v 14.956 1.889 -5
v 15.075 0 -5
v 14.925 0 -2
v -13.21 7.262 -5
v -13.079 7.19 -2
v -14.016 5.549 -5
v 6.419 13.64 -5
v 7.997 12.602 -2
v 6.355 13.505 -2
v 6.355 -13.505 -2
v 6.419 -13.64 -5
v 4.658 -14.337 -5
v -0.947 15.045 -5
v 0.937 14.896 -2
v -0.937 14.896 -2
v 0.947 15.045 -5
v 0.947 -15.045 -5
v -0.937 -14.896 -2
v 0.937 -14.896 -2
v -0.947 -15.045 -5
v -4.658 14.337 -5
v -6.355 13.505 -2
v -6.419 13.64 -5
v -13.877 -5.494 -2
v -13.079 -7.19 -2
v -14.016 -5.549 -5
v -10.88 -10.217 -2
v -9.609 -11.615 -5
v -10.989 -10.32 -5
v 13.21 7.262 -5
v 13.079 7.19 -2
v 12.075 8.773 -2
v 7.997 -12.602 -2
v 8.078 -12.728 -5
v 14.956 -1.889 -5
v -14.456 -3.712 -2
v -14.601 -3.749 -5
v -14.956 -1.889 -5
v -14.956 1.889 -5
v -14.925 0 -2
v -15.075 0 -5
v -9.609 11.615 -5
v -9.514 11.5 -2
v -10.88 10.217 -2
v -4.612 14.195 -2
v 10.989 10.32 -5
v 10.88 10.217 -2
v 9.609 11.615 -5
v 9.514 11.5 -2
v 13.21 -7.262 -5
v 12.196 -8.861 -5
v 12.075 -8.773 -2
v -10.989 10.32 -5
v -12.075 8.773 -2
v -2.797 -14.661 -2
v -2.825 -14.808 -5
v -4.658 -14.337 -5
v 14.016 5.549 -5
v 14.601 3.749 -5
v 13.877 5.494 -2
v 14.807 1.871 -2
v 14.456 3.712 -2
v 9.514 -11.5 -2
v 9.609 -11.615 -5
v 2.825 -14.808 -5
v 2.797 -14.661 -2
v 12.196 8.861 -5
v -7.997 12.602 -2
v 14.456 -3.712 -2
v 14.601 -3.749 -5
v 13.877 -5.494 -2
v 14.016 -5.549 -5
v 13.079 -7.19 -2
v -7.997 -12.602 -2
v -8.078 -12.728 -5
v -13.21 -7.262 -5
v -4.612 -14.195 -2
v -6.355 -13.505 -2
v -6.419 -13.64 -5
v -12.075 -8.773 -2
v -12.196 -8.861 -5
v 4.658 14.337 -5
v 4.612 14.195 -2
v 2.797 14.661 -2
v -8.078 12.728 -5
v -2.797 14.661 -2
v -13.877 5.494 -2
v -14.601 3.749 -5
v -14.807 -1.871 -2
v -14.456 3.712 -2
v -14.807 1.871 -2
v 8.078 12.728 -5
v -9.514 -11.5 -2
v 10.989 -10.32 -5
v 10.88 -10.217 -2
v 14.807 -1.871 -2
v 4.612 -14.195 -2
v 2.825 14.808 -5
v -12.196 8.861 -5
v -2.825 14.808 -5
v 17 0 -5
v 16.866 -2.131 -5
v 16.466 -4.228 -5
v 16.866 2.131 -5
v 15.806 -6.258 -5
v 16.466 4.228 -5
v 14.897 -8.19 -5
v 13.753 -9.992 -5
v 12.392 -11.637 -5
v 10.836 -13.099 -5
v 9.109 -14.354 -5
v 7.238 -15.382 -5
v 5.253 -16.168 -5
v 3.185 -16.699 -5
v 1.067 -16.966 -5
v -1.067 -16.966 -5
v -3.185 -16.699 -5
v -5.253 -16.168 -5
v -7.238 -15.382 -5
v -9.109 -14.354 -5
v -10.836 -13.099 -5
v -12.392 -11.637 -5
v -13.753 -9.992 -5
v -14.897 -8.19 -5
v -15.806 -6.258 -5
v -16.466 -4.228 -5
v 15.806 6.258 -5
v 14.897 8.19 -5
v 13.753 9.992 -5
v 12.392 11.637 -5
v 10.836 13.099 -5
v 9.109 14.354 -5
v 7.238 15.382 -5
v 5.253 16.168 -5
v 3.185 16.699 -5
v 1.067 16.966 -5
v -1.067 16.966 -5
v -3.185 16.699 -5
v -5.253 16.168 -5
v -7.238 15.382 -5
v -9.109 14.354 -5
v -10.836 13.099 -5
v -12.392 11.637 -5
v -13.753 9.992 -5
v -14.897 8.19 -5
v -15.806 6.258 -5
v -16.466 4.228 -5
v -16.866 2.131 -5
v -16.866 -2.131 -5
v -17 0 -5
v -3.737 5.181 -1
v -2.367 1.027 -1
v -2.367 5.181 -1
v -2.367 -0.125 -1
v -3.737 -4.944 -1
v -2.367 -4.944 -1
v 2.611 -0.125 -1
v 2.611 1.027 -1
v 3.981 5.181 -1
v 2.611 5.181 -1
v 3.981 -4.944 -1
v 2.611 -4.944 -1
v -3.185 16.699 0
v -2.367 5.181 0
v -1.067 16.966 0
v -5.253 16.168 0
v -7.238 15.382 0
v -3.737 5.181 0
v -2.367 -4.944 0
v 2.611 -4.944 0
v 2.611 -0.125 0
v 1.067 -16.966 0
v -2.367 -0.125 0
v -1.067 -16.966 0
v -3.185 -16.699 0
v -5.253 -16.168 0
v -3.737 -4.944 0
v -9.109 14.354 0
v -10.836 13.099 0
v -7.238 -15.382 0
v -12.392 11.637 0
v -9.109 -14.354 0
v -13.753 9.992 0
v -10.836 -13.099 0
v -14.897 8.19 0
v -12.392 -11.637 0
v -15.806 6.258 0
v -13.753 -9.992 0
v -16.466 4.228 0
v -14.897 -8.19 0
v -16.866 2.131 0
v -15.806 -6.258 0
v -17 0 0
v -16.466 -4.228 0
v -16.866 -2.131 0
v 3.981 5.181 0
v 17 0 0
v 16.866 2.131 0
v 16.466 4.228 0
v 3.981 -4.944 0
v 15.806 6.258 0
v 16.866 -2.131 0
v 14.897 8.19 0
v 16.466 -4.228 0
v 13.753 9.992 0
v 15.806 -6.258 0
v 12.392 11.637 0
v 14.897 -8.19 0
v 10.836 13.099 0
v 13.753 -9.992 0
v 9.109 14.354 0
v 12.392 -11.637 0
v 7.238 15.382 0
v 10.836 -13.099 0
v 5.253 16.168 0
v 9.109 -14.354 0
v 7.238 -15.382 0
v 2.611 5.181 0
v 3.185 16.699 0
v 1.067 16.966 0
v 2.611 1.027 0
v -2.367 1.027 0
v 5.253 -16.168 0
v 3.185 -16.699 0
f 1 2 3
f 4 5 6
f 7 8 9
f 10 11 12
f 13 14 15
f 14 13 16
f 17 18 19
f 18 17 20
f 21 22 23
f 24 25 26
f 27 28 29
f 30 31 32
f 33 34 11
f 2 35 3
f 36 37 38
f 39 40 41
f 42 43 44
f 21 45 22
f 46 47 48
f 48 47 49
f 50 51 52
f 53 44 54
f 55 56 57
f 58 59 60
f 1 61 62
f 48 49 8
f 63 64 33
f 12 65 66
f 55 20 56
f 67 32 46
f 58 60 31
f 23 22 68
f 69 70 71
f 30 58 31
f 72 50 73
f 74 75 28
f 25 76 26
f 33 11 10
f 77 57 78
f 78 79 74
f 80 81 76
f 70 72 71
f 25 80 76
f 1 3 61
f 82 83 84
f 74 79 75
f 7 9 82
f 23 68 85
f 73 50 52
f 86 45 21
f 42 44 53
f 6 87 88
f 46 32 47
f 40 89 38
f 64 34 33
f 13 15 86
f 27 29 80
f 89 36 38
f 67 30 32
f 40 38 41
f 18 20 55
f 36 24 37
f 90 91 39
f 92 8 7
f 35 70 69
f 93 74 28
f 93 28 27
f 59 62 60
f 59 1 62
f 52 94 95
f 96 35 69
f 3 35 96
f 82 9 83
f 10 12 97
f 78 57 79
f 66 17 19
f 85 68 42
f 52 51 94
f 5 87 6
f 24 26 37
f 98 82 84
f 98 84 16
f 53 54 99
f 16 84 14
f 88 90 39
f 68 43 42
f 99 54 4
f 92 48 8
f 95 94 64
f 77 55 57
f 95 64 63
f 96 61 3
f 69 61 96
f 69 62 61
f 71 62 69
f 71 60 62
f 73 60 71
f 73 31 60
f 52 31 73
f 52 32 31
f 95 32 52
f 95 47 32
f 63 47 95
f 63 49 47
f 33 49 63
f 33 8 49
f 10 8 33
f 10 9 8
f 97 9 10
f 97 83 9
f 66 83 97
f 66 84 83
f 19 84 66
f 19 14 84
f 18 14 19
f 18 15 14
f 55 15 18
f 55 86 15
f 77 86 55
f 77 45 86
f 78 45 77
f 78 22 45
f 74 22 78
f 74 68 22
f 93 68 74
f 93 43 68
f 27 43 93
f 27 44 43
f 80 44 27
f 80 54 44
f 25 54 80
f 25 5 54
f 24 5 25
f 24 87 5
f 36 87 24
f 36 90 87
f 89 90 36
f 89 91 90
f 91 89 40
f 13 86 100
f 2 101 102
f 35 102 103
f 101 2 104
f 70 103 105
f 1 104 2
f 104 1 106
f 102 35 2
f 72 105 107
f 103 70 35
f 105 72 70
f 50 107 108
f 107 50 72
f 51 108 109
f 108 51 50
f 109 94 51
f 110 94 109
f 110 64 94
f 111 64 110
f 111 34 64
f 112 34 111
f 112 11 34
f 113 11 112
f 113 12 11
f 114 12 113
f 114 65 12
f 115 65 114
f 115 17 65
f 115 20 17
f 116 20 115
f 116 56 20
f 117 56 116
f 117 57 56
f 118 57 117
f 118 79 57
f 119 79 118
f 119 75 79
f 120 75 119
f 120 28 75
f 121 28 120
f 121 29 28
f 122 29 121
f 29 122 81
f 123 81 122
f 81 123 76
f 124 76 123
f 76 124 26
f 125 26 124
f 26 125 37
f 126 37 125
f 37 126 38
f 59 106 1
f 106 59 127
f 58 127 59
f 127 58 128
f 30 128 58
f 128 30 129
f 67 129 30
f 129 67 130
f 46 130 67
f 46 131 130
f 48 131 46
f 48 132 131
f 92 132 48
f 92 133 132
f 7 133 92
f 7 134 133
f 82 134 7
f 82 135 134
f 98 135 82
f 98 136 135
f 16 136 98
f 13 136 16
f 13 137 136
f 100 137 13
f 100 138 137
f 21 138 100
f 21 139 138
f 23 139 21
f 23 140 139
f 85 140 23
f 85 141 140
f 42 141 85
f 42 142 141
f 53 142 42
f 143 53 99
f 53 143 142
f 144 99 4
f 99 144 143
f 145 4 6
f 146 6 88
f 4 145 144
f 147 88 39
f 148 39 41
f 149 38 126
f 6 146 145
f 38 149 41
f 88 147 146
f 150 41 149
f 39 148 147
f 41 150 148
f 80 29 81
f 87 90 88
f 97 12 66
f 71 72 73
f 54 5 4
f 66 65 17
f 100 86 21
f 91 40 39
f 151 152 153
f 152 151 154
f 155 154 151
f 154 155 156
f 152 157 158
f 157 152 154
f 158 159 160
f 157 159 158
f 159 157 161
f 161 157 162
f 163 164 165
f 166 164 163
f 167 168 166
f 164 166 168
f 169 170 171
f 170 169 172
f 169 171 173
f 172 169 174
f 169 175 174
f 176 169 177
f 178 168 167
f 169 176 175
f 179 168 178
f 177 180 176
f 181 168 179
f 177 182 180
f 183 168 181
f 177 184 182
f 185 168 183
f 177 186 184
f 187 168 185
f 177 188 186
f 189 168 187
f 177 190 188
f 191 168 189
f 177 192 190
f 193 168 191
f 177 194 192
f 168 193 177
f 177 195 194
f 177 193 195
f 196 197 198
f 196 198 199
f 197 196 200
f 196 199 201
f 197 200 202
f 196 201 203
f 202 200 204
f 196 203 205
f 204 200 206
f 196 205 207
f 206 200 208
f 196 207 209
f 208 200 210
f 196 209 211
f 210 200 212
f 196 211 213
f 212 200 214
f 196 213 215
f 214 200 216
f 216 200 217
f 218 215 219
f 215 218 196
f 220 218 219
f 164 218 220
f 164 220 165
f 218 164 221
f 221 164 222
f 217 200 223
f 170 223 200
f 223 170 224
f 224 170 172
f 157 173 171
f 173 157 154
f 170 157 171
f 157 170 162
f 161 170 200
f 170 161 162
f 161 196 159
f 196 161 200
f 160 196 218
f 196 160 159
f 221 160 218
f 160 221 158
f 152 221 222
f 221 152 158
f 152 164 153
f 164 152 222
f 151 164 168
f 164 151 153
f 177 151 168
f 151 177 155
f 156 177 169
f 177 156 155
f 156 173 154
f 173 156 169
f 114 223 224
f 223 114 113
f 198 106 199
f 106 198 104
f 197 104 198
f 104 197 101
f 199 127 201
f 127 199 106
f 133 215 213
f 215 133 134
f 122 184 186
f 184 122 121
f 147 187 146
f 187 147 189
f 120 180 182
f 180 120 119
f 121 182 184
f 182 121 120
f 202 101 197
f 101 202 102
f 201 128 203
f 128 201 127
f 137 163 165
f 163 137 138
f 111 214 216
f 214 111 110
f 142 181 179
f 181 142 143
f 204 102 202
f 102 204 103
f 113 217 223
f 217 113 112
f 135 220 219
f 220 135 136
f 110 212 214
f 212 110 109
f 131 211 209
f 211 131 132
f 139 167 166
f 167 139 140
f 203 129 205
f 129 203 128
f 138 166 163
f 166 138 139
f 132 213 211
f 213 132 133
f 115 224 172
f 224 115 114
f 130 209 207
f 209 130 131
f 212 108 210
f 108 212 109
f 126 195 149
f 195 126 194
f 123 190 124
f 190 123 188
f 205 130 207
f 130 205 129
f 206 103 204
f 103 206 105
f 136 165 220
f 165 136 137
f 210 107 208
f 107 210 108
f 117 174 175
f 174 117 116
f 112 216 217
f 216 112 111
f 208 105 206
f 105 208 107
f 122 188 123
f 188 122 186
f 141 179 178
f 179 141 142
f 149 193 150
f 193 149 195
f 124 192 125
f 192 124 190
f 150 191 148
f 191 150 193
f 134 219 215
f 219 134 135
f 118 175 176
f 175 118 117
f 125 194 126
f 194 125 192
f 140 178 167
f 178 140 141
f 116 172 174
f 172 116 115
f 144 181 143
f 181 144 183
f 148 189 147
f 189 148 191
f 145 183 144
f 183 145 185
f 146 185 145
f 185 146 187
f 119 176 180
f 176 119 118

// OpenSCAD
$fn = 50;


difference() {
	union() {
		translate(v = [0, 0, -5.0000000000]) {
			cylinder(h = 5, r = 17.0000000000);
		}
	}
	union() {
		#translate(v = [0, 0, -5.0000000000]) {
			cylinder(h = 3, r1 = 15.0750000000, r2 = 14.9250000000);
		}
		translate(v = [0, 0, -1]) {
			linear_extrude(height = 1) {
				text(font = "Impact", halign = "center", size = 10, text = "H", valign = "center");
			}
		}
	}
}
